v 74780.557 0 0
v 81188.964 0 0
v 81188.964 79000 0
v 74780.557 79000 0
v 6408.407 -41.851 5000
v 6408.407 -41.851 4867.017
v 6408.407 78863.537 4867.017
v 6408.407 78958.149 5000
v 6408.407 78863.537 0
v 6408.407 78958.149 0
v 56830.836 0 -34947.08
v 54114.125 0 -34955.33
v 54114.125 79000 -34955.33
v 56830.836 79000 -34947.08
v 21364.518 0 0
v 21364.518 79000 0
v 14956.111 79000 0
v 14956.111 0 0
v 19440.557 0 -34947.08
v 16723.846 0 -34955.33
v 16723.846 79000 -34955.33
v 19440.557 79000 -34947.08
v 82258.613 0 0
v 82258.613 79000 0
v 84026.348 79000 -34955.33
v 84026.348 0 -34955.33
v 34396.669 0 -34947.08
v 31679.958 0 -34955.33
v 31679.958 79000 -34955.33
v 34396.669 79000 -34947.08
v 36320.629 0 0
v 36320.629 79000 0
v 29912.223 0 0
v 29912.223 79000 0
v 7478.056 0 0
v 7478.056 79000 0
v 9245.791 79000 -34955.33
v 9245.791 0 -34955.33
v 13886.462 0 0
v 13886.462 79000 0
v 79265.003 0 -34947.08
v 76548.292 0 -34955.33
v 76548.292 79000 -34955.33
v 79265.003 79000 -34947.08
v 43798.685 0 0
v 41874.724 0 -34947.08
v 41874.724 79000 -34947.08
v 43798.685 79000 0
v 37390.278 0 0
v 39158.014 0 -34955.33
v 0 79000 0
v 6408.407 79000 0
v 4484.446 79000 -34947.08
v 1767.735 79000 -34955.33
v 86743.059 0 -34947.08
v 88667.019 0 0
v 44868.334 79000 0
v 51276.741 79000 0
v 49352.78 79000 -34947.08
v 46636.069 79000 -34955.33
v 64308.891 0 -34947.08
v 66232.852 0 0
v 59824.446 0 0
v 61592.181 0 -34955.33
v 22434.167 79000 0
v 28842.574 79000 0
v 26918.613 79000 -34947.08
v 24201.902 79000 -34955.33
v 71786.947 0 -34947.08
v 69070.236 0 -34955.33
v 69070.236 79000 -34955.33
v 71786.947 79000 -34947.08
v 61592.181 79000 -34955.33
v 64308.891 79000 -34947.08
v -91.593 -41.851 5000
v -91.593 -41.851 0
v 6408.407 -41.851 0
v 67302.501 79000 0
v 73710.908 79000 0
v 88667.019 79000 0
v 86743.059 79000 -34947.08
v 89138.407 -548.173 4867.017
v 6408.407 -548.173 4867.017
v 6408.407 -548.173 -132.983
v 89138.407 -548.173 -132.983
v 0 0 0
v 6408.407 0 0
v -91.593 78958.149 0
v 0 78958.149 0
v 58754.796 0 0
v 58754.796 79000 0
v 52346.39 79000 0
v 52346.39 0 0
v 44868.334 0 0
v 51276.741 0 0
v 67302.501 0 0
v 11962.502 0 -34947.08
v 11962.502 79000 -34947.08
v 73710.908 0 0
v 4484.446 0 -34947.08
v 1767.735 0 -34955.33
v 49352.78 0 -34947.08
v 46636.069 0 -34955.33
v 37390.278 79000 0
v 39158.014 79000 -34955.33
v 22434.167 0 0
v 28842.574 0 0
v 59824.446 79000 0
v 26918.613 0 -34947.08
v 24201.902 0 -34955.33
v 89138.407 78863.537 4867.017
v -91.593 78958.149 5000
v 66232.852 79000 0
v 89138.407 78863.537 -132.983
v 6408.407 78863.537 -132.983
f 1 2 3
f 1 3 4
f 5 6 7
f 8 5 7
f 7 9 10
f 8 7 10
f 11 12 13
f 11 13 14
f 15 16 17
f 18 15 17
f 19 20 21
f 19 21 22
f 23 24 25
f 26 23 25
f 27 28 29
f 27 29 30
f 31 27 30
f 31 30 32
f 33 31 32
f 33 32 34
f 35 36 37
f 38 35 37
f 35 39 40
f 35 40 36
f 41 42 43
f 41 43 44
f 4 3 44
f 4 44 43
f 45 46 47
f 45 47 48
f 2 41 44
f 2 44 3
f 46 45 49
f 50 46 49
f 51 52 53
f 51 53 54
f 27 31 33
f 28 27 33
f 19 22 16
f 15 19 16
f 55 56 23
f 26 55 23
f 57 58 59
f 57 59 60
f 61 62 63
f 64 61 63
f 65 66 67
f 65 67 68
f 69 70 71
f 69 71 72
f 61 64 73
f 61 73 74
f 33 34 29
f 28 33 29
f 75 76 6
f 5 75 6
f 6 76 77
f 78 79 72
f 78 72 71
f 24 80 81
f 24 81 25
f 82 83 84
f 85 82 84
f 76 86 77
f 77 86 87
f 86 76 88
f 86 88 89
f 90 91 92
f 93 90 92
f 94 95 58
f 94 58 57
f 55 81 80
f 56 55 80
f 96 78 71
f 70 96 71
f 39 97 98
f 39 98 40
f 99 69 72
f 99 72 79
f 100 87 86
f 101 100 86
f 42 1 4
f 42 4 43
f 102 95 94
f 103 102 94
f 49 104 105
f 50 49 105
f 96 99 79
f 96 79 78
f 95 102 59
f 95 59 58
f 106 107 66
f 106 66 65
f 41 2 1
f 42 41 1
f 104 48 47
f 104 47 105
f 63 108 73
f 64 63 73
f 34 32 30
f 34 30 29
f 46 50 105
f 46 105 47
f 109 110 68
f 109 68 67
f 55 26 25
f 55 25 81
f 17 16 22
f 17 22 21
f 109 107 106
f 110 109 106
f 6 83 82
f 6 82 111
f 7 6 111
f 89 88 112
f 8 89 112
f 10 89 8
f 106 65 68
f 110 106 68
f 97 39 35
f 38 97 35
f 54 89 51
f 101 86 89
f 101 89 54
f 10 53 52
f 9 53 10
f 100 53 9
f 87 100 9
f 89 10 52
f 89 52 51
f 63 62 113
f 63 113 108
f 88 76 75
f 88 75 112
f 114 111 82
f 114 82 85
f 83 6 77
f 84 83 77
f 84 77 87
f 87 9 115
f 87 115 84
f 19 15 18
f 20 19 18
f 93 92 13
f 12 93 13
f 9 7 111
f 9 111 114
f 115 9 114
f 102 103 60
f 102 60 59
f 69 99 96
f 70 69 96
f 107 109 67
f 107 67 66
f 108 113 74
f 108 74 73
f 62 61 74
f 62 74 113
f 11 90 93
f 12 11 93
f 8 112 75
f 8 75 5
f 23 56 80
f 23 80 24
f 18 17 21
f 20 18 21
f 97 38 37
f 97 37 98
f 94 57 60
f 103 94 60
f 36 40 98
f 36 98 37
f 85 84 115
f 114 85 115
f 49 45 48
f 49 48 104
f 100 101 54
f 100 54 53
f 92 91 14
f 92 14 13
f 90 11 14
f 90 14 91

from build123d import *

# Parameters (mm, degrees)
BOSS_EXTRUDE2_DEPTH    = 79000
BOSS_EXTRUDE2_2_DEPTH  = 79000
BOSS_EXTRUDE2_3_DEPTH  = 79000
BOSS_EXTRUDE2_4_DEPTH  = 79000
BOSS_EXTRUDE2_5_DEPTH  = 79000
BOSS_EXTRUDE2_6_DEPTH  = 79000
BOSS_EXTRUDE2_7_DEPTH  = 79000
BOSS_EXTRUDE2_8_DEPTH  = 79000
BOSS_EXTRUDE2_9_DEPTH  = 79000
BOSS_EXTRUDE2_10_DEPTH = 79000
BOSS_EXTRUDE2_11_DEPTH = 79000
BOSS_EXTRUDE2_12_DEPTH = 79000
SKETCH1_W              = 6500
SKETCH1_H              = 79000
BOSS_EXTRUDE3_DEPTH    = 5000
SKETCH5_W              = 5000
SKETCH5_H              = 79411.709707549
BOSS_EXTRUDE4_DEPTH    = 82730


with BuildPart() as part:
    # Sketch2 → Boss-Extrude2 (new body)
    with BuildSketch(Plane(origin=(0, 0, 0), x_dir=(1, 0, 0), z_dir=(0, 1, 0))):
        Polygon((0, 0), (1767.735100562, 34955.330246105), (4484.445899835, 34947.079637387), (6408.406611002, 0), align=None)
    extrude(amount=BOSS_EXTRUDE2_DEPTH)

    # Sketch1 → Boss-Extrude3 (add)
    with BuildSketch(Plane.XY):
        with Locations((3158.406611002, 39458.149234792)):
            Rectangle(SKETCH1_W, SKETCH1_H)
    extrude(amount=BOSS_EXTRUDE3_DEPTH)

    # Sketch5 → Boss-Extrude4 (add)
    with BuildSketch(Plane(origin=(6408.406611002, 864.469640722, -1423.254135241), x_dir=(0, 0, -1), z_dir=(1, 0, 0))):
        with Locations((-3790.271139959, 38293.212450306)):
            Rectangle(SKETCH5_W, SKETCH5_H)
    extrude(amount=BOSS_EXTRUDE4_DEPTH)


with BuildPart() as body_2:
    # Sketch2 → Boss-Extrude2 2 (new body)
    with BuildSketch(Plane(origin=(0, 0, 0), x_dir=(1, 0, 0), z_dir=(0, 1, 0))):
        Polygon((7478.055691895, 0), (9245.790792456, 34955.330246105), (11962.50159173, 34947.079637387), (13886.462302897, 0), align=None)
    extrude(amount=BOSS_EXTRUDE2_2_DEPTH)


with BuildPart() as body_3:
    # Sketch2 → Boss-Extrude2 3 (new body)
    with BuildSketch(Plane(origin=(0, 0, 0), x_dir=(1, 0, 0), z_dir=(0, 1, 0))):
        Polygon((14956.111383789, 0), (16723.846484351, 34955.330246105), (19440.557283624, 34947.079637387), (21364.517994792, 0), align=None)
    extrude(amount=BOSS_EXTRUDE2_3_DEPTH)


with BuildPart() as body_4:
    # Sketch2 → Boss-Extrude2 4 (new body)
    with BuildSketch(Plane(origin=(0, 0, 0), x_dir=(1, 0, 0), z_dir=(0, 1, 0))):
        Polygon((22434.167075684, 0), (24201.902176245, 34955.330246105), (26918.612975519, 34947.079637387), (28842.573686686, 0), align=None)
    extrude(amount=BOSS_EXTRUDE2_4_DEPTH)


with BuildPart() as body_5:
    # Sketch2 → Boss-Extrude2 5 (new body)
    with BuildSketch(Plane(origin=(0, 0, 0), x_dir=(1, 0, 0), z_dir=(0, 1, 0))):
        Polygon((29912.222767578, 0), (31679.95786814, 34955.330246105), (34396.668667414, 34947.079637387), (36320.629378581, 0), align=None)
    extrude(amount=BOSS_EXTRUDE2_5_DEPTH)


with BuildPart() as body_6:
    # Sketch2 → Boss-Extrude2 6 (new body)
    with BuildSketch(Plane(origin=(0, 0, 0), x_dir=(1, 0, 0), z_dir=(0, 1, 0))):
        Polygon((37390.278459473, 0), (39158.013560035, 34955.330246105), (41874.724359308, 34947.079637387), (43798.685070475, 0), align=None)
    extrude(amount=BOSS_EXTRUDE2_6_DEPTH)


with BuildPart() as body_7:
    # Sketch2 → Boss-Extrude2 7 (new body)
    with BuildSketch(Plane(origin=(0, 0, 0), x_dir=(1, 0, 0), z_dir=(0, 1, 0))):
        Polygon((44868.334151367, 0), (46636.069251929, 34955.330246105), (49352.780051203, 34947.079637387), (51276.74076237, 0), align=None)
    extrude(amount=BOSS_EXTRUDE2_7_DEPTH)


with BuildPart() as body_8:
    # Sketch2 → Boss-Extrude2 8 (new body)
    with BuildSketch(Plane(origin=(0, 0, 0), x_dir=(1, 0, 0), z_dir=(0, 1, 0))):
        Polygon((52346.389843262, 0), (54114.124943824, 34955.330246105), (56830.835743097, 34947.079637387), (58754.796454264, 0), align=None)
    extrude(amount=BOSS_EXTRUDE2_8_DEPTH)


with BuildPart() as body_9:
    # Sketch2 → Boss-Extrude2 9 (new body)
    with BuildSketch(Plane(origin=(0, 0, 0), x_dir=(1, 0, 0), z_dir=(0, 1, 0))):
        Polygon((59824.445535156, 0), (61592.180635718, 34955.330246105), (64308.891434992, 34947.079637387), (66232.852146159, 0), align=None)
    extrude(amount=BOSS_EXTRUDE2_9_DEPTH)


with BuildPart() as body_10:
    # Sketch2 → Boss-Extrude2 10 (new body)
    with BuildSketch(Plane(origin=(0, 0, 0), x_dir=(1, 0, 0), z_dir=(0, 1, 0))):
        Polygon((67302.501227051, 0), (69070.236327613, 34955.330246105), (71786.947126886, 34947.079637387), (73710.907838053, 0), align=None)
    extrude(amount=BOSS_EXTRUDE2_10_DEPTH)


with BuildPart() as body_11:
    # Sketch2 → Boss-Extrude2 11 (new body)
    with BuildSketch(Plane(origin=(0, 0, 0), x_dir=(1, 0, 0), z_dir=(0, 1, 0))):
        Polygon((74780.556918946, 0), (76548.292019507, 34955.330246105), (79265.002818781, 34947.079637387), (81188.963529948, 0), align=None)
    extrude(amount=BOSS_EXTRUDE2_11_DEPTH)


with BuildPart() as body_12:
    # Sketch2 → Boss-Extrude2 12 (new body)
    with BuildSketch(Plane(origin=(0, 0, 0), x_dir=(1, 0, 0), z_dir=(0, 1, 0))):
        Polygon((82258.61261084, 0), (84026.347711402, 34955.330246105), (86743.058510675, 34947.079637387), (88667.019221843, 0), align=None)
    extrude(amount=BOSS_EXTRUDE2_12_DEPTH)


solid = Compound([part.part, body_2.part, body_3.part, body_4.part, body_5.part, body_6.part, body_7.part, body_8.part, body_9.part, body_10.part, body_11.part, body_12.part])
